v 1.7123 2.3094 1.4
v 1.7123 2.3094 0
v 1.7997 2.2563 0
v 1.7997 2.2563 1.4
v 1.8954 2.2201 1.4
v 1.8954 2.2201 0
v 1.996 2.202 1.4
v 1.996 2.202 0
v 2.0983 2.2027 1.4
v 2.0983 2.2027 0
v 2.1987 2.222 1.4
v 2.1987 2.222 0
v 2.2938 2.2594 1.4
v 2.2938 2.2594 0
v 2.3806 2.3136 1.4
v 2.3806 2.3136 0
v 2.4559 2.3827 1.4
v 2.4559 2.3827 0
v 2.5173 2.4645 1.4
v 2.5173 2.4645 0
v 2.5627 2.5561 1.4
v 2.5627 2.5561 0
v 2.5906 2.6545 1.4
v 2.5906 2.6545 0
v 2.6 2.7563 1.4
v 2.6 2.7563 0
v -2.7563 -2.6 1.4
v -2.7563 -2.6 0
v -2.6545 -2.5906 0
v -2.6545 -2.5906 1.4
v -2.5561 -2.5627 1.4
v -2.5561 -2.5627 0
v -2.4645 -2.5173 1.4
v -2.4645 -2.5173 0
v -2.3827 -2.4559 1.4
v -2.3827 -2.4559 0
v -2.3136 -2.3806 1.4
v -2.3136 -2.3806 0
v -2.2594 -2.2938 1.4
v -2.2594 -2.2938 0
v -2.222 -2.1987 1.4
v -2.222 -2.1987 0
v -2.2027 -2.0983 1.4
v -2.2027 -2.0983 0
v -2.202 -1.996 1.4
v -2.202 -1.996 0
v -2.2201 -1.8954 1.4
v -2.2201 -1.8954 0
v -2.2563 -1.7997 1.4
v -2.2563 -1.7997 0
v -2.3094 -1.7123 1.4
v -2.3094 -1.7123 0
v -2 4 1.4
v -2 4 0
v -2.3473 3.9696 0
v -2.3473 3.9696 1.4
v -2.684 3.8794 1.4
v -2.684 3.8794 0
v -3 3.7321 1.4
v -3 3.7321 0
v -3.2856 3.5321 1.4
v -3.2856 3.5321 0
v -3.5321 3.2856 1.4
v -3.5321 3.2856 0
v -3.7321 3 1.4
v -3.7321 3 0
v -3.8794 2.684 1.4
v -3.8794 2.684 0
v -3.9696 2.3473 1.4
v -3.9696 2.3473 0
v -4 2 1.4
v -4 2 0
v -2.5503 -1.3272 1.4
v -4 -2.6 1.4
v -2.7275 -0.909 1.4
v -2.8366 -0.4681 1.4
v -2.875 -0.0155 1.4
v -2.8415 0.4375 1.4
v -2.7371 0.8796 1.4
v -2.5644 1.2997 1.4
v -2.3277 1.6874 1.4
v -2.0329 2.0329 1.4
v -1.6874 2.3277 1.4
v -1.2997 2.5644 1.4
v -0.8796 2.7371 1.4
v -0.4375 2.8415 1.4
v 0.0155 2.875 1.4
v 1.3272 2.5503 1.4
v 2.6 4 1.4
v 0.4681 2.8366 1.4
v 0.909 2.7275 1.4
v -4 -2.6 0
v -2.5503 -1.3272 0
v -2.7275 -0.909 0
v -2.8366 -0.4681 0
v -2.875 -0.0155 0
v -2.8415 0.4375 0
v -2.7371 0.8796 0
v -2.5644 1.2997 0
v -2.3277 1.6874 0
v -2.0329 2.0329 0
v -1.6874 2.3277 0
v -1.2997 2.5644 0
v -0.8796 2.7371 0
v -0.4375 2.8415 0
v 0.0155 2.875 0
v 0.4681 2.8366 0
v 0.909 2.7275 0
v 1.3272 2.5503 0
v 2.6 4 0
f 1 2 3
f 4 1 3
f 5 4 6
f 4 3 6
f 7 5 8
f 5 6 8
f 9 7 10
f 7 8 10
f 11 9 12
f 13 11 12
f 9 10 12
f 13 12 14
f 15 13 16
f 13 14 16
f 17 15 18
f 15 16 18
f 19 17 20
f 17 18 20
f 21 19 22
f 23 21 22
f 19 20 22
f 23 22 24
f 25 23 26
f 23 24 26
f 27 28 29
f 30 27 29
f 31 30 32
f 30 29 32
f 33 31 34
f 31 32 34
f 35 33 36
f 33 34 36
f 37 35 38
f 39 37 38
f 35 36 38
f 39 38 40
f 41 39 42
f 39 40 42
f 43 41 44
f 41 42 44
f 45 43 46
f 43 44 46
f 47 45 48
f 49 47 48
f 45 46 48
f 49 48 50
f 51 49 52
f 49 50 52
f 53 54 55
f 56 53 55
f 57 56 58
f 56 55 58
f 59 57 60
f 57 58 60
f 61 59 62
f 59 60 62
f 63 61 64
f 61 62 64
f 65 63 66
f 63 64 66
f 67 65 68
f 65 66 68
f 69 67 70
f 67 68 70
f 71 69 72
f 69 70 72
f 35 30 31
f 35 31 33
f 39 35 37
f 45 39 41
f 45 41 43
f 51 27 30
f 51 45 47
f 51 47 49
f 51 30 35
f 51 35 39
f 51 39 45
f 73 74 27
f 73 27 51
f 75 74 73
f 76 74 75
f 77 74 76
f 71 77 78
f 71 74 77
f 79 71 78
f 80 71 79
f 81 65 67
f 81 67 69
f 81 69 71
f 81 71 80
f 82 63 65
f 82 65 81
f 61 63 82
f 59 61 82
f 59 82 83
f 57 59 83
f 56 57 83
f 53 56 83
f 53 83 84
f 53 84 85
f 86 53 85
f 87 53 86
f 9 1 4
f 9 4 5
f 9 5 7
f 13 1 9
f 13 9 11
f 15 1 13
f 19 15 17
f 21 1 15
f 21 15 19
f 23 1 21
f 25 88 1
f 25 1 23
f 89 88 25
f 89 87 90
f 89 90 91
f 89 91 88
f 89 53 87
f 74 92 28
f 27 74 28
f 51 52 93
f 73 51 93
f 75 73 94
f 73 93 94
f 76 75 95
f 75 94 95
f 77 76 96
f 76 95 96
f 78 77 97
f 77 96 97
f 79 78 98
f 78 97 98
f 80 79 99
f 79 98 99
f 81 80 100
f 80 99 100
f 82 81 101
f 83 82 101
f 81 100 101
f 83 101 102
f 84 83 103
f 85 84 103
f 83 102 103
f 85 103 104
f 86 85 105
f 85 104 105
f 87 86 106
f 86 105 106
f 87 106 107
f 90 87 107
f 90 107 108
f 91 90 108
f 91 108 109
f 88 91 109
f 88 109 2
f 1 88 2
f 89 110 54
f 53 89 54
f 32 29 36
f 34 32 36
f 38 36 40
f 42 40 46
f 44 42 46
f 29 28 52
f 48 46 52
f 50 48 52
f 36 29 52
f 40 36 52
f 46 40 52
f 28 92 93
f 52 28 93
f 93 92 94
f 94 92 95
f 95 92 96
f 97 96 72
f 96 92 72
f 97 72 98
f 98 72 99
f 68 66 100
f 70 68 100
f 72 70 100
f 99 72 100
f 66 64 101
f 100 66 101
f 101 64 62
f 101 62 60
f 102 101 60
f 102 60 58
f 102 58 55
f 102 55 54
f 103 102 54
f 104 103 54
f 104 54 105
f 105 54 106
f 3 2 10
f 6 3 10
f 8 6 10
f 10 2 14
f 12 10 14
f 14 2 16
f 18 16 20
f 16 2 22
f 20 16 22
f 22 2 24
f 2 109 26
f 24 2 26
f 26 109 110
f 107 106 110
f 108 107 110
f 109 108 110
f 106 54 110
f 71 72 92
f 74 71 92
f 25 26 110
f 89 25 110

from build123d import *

# Parameters (mm, degrees)
SALIENTE_EXTRUIR1_DEPTH = 1.4


with BuildPart() as part:
    # Croquis1 → Saliente-Extruir1 (new body)
    with BuildSketch(Plane.XY):
        with BuildLine():
            Line((2.6, 4), (-2, 4))
            ThreePointArc((-2, 4), (-3.414213562, 3.414213562), (-4, 2))
            Line((-4, 2), (-4, -2.6))
            Line((-4, -2.6), (-2.756314656, -2.6))
            ThreePointArc((-2.756314656, -2.6), (-2.259416606, -2.293841943), (-2.309436887, -1.712345253))
            ThreePointArc((-2.309436887, -1.712345253), (-2.032931996, 2.032931996), (1.712345253, 2.309436887))
            ThreePointArc((1.712345253, 2.309436887), (2.293841943, 2.259416606), (2.6, 2.756314656))
            Line((2.6, 2.756314656), (2.6, 4))
        make_face()
    extrude(amount=SALIENTE_EXTRUIR1_DEPTH)


solid = part.part
